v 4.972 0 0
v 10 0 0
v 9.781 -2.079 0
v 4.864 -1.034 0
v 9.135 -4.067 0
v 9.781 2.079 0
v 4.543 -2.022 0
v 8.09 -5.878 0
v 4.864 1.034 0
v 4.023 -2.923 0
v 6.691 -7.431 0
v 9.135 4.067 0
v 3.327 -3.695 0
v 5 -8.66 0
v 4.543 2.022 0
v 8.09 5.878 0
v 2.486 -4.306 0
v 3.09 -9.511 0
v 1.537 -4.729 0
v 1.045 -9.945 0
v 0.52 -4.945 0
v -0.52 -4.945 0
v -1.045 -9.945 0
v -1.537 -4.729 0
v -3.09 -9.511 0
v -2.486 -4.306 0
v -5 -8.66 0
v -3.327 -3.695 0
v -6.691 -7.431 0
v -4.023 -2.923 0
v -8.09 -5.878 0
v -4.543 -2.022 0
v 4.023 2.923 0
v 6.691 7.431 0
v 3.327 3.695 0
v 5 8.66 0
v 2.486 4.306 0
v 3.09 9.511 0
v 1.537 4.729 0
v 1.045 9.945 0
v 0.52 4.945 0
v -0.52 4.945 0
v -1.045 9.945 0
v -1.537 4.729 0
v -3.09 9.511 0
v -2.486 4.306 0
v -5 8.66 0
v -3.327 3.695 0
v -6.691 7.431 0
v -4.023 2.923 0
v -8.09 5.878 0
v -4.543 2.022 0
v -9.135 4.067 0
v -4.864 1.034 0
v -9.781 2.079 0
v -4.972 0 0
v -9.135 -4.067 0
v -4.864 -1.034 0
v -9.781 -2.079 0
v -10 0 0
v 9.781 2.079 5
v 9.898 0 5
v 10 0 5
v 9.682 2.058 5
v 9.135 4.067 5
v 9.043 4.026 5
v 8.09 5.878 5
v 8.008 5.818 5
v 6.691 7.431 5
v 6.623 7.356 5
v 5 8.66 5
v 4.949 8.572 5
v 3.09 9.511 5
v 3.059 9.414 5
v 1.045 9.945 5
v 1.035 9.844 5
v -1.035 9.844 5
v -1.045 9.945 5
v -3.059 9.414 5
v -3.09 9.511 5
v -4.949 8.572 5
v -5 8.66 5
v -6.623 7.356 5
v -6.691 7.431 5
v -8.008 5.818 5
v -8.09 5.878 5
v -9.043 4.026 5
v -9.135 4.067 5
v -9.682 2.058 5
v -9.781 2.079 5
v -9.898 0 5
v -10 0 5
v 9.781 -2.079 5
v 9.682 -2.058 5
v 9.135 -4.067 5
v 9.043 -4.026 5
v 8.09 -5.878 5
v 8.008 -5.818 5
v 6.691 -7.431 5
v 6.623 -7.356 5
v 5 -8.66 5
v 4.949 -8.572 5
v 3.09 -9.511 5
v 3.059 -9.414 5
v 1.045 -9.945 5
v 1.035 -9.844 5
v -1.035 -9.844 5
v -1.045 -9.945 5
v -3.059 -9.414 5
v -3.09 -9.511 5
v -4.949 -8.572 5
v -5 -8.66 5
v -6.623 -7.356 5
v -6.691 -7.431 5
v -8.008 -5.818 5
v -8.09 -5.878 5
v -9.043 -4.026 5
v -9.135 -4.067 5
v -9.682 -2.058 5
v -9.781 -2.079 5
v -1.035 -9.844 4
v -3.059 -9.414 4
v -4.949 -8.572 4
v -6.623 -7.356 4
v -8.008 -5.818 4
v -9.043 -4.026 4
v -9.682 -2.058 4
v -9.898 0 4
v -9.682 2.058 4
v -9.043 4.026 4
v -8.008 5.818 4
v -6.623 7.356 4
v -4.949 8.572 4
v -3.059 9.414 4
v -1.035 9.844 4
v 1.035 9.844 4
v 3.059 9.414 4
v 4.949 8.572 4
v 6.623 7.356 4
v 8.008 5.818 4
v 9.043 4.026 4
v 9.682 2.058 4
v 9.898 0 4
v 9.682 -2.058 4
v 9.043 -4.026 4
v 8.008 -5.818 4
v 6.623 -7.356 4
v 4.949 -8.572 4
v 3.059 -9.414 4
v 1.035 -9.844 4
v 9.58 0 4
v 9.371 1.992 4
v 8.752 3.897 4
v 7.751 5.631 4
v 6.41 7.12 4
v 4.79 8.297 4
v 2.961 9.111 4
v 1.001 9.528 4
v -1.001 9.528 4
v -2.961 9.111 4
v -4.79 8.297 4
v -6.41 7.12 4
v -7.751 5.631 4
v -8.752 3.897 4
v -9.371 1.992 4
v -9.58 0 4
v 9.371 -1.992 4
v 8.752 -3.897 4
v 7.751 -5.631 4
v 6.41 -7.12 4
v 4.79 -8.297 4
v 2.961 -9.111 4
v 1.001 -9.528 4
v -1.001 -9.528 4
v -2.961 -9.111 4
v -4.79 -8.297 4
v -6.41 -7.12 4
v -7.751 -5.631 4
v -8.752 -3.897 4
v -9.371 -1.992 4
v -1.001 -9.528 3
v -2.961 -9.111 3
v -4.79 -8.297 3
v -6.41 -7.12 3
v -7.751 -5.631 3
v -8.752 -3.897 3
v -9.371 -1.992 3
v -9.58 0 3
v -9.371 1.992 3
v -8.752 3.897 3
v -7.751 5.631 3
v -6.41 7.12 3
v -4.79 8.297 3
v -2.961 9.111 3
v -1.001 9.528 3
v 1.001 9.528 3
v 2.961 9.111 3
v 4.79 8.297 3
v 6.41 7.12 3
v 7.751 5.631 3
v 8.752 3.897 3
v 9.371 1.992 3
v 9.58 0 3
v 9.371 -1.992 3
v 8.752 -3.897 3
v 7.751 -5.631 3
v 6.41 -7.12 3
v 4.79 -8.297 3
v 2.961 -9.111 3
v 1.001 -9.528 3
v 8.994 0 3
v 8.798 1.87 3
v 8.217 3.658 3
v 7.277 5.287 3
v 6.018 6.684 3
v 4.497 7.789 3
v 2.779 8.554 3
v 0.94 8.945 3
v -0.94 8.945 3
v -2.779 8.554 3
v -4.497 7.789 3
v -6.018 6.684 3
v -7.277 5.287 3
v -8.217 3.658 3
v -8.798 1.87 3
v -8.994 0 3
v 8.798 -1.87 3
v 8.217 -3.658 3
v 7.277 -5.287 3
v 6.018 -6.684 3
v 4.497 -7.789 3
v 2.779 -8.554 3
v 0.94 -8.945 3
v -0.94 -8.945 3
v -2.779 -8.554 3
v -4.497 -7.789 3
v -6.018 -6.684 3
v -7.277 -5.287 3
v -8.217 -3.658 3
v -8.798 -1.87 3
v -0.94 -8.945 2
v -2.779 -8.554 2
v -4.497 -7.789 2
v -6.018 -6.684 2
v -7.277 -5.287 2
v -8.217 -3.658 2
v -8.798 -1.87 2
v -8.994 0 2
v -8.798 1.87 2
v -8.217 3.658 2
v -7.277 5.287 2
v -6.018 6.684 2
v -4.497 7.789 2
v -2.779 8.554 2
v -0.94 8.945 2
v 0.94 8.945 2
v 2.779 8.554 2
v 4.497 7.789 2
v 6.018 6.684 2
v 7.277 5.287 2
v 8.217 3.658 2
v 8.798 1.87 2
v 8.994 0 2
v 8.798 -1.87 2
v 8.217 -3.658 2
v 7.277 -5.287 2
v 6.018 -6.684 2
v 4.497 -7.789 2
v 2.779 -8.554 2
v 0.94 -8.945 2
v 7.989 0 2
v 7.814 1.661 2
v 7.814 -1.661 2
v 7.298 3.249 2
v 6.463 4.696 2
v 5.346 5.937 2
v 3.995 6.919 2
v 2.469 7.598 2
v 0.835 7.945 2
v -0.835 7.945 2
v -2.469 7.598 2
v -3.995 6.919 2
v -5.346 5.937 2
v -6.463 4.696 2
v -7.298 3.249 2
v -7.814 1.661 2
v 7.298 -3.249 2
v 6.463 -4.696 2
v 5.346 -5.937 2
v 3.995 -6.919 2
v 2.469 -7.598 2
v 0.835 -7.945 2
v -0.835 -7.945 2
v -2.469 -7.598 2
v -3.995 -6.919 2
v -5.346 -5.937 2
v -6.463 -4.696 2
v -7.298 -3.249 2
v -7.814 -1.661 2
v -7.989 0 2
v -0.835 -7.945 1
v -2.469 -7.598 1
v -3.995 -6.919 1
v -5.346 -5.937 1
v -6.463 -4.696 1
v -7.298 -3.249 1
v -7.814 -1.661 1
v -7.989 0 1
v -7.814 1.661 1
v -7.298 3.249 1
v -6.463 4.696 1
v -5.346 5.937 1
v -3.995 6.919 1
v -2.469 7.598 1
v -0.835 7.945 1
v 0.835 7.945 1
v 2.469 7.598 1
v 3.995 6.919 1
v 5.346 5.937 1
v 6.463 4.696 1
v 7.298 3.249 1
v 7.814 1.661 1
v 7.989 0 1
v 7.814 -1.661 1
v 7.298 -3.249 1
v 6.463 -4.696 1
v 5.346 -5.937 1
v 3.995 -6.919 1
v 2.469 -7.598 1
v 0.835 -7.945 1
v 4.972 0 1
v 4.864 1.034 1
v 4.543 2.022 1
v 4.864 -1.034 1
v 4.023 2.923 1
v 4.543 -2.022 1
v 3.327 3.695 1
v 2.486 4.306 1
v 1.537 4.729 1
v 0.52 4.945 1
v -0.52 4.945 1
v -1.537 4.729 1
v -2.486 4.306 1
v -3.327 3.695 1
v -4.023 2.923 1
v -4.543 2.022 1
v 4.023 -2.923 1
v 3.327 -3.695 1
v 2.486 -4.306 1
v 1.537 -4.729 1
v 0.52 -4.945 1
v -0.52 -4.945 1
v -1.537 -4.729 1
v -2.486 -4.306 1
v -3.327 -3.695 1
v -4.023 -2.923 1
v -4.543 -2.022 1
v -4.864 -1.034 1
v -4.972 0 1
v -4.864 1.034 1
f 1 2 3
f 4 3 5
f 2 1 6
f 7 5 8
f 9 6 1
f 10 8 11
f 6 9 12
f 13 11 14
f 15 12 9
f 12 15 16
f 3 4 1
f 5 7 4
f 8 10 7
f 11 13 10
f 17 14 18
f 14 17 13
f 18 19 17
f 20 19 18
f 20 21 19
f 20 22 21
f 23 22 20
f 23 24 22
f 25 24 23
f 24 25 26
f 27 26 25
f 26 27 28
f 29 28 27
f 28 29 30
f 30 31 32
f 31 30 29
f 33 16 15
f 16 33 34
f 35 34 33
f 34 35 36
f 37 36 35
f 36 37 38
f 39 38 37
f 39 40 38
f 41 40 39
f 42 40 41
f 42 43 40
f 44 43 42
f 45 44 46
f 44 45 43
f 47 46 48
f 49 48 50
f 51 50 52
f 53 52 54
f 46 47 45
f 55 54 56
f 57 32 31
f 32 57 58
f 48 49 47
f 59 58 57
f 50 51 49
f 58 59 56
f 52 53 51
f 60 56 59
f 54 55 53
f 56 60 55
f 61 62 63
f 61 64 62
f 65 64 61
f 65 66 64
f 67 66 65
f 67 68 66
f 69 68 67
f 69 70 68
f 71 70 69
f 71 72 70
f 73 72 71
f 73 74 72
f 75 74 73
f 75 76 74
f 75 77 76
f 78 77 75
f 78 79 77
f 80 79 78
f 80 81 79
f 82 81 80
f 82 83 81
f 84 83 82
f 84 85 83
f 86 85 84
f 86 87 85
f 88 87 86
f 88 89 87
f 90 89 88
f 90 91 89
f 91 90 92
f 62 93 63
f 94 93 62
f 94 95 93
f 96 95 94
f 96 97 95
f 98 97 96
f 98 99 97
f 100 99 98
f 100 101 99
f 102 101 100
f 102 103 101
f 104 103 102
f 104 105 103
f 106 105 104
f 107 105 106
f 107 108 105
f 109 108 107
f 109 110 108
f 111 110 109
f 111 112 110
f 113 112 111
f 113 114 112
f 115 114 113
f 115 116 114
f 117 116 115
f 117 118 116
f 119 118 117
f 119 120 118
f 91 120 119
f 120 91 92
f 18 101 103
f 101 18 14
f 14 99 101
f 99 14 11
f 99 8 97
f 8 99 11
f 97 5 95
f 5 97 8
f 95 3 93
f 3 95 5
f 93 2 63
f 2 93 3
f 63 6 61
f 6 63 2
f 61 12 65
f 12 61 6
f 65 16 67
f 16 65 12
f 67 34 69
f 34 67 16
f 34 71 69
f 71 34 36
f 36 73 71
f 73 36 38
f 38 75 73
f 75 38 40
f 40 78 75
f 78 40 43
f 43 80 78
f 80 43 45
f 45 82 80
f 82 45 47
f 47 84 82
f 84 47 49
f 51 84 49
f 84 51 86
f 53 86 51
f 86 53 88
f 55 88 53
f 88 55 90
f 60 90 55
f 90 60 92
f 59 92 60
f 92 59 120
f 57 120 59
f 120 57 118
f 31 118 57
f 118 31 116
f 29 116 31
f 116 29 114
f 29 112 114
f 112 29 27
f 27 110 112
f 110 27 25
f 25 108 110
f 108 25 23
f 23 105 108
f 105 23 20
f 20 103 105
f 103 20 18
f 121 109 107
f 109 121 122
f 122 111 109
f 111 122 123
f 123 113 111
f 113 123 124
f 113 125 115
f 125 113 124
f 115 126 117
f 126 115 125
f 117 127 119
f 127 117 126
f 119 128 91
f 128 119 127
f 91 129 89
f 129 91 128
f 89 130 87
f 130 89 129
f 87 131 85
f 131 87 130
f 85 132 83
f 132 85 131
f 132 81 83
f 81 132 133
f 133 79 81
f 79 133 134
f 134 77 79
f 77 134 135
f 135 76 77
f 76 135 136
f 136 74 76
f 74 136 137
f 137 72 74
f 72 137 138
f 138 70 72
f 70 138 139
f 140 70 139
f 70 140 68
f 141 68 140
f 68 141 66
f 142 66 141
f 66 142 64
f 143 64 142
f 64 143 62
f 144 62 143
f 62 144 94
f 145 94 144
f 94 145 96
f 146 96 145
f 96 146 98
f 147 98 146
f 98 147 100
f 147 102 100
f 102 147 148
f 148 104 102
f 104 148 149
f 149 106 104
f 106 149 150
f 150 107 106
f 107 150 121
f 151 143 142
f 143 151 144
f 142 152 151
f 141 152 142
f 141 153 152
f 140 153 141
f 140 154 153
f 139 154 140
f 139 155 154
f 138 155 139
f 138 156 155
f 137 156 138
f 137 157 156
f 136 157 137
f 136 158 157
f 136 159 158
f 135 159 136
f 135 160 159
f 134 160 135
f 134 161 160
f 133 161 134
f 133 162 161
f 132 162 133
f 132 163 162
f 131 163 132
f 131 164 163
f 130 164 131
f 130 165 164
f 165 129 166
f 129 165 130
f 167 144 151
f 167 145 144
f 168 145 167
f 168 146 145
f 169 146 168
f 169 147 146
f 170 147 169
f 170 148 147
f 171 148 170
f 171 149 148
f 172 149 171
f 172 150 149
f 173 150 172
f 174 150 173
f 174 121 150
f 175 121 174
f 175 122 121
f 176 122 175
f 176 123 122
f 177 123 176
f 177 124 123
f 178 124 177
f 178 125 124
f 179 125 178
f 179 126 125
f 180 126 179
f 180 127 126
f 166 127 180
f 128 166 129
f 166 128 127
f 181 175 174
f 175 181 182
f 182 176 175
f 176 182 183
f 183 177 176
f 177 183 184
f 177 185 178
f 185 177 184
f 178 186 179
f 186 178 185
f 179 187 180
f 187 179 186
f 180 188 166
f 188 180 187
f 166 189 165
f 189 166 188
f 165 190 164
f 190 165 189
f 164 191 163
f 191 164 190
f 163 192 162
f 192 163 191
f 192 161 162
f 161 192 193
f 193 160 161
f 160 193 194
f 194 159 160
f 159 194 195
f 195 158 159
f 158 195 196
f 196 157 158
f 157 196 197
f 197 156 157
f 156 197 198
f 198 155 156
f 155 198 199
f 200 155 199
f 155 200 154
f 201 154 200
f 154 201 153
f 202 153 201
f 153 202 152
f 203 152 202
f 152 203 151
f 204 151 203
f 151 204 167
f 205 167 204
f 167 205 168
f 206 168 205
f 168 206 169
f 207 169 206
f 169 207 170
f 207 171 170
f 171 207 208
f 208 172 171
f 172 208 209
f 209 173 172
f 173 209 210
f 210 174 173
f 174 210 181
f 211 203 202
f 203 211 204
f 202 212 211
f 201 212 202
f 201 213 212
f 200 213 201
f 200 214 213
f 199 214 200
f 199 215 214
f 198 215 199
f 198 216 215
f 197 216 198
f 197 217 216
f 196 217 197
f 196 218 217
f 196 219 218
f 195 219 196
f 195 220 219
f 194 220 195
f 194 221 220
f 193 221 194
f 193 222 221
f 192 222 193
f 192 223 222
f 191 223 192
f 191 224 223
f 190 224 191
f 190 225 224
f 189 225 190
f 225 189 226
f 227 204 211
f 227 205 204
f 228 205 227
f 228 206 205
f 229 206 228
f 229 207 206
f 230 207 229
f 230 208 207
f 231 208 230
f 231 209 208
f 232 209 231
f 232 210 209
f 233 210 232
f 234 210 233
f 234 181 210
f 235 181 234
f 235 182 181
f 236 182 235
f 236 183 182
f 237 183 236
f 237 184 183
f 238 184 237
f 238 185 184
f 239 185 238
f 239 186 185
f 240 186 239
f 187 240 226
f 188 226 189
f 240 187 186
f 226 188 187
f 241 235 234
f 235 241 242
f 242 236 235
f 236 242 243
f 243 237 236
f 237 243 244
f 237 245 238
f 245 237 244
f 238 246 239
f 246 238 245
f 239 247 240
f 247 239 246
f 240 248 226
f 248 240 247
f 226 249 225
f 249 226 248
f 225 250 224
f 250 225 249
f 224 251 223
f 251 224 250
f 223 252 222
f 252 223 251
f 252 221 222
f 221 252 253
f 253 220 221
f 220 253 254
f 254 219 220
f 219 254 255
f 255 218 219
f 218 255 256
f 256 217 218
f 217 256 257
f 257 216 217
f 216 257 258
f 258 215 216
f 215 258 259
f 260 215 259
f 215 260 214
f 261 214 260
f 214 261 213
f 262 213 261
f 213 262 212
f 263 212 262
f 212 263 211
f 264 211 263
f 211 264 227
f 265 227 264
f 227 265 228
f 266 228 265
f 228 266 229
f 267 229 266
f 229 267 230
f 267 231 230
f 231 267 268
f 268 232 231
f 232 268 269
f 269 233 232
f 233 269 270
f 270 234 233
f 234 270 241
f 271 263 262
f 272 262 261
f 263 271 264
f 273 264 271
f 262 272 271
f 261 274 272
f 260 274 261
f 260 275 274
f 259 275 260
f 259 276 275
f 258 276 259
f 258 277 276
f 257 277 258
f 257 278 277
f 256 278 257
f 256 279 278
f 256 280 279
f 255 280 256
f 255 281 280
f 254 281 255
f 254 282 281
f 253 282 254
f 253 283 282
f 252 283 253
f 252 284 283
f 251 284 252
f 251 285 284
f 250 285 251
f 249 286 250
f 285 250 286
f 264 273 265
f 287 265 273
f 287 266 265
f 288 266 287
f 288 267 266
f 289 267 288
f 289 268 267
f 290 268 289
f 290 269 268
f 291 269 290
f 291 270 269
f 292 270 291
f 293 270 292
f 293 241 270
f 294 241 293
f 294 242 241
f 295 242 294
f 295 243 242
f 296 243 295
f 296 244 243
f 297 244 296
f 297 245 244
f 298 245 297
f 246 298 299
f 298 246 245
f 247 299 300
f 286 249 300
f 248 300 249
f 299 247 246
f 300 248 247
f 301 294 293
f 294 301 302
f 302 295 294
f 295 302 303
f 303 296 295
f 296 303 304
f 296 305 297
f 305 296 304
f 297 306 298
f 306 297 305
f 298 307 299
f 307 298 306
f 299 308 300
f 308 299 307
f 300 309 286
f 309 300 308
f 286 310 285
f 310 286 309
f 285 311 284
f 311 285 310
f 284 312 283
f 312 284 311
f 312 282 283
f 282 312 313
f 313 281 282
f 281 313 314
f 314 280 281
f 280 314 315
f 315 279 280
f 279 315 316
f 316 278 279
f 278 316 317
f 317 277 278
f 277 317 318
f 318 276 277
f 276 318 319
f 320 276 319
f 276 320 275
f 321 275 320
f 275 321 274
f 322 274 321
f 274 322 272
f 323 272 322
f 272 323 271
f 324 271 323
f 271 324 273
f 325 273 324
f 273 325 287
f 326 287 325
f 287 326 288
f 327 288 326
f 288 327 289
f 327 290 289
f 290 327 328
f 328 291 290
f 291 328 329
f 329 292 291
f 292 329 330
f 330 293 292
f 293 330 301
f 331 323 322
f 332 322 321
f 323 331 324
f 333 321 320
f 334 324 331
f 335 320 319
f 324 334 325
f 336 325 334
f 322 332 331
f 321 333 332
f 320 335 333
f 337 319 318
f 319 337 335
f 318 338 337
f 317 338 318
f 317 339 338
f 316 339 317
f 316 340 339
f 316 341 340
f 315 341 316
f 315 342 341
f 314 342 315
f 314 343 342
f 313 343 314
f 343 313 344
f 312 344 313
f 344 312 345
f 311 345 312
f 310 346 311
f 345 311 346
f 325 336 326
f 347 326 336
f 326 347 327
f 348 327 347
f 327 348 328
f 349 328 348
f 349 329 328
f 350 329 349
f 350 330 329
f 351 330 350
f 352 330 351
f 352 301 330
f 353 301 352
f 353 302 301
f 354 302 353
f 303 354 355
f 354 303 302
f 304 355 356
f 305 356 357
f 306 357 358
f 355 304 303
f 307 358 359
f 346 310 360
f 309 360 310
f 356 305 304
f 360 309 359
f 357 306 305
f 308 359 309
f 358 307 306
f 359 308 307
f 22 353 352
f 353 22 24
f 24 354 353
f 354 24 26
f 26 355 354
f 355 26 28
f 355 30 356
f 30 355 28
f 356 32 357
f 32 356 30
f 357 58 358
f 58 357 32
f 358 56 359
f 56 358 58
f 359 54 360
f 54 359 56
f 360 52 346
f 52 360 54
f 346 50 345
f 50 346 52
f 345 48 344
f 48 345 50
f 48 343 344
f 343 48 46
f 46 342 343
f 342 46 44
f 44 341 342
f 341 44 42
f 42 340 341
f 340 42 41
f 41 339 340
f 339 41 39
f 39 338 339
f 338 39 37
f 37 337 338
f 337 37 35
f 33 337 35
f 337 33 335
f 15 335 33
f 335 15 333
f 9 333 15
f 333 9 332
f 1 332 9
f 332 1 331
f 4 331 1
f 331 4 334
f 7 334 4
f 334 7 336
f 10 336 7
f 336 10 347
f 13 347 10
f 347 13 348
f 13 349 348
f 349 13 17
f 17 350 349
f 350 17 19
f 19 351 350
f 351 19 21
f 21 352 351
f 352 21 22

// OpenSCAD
union() {
    union() {
        linear_extrude(height=5) {
            difference() {
                offset(r=0) {
                    circle(r=10);
                };
                offset(r=-0.10102051443364402) {
                    circle(r=10);
                };
            };
        };
        linear_extrude(height=4) {
            difference() {
                offset(r=-0.10102051443364402) {
                    circle(r=10);
                };
                offset(r=-0.41742430504416006) {
                    circle(r=10);
                };
            };
        };
        linear_extrude(height=3) {
            difference() {
                offset(r=-0.41742430504416006) {
                    circle(r=10);
                };
                offset(r=-0.9999999999999998) {
                    circle(r=10);
                };
            };
        };
        linear_extrude(height=2) {
            difference() {
                offset(r=-0.9999999999999998) {
                    circle(r=10);
                };
                offset(r=-2.000000000000001) {
                    circle(r=10);
                };
            };
        };
        linear_extrude(height=1) {
            difference() {
                offset(r=-2.000000000000001) {
                    circle(r=10);
                };
                offset(r=-5) {
                    circle(r=10);
                };
            };
        };
    };
    %difference() {
        translate(v=[0, 0, 2.5]) {
            cube(size=[25, 25, 5], center=true);
        };
        cylinder(r=10, h=20, center=true);
    };
};
